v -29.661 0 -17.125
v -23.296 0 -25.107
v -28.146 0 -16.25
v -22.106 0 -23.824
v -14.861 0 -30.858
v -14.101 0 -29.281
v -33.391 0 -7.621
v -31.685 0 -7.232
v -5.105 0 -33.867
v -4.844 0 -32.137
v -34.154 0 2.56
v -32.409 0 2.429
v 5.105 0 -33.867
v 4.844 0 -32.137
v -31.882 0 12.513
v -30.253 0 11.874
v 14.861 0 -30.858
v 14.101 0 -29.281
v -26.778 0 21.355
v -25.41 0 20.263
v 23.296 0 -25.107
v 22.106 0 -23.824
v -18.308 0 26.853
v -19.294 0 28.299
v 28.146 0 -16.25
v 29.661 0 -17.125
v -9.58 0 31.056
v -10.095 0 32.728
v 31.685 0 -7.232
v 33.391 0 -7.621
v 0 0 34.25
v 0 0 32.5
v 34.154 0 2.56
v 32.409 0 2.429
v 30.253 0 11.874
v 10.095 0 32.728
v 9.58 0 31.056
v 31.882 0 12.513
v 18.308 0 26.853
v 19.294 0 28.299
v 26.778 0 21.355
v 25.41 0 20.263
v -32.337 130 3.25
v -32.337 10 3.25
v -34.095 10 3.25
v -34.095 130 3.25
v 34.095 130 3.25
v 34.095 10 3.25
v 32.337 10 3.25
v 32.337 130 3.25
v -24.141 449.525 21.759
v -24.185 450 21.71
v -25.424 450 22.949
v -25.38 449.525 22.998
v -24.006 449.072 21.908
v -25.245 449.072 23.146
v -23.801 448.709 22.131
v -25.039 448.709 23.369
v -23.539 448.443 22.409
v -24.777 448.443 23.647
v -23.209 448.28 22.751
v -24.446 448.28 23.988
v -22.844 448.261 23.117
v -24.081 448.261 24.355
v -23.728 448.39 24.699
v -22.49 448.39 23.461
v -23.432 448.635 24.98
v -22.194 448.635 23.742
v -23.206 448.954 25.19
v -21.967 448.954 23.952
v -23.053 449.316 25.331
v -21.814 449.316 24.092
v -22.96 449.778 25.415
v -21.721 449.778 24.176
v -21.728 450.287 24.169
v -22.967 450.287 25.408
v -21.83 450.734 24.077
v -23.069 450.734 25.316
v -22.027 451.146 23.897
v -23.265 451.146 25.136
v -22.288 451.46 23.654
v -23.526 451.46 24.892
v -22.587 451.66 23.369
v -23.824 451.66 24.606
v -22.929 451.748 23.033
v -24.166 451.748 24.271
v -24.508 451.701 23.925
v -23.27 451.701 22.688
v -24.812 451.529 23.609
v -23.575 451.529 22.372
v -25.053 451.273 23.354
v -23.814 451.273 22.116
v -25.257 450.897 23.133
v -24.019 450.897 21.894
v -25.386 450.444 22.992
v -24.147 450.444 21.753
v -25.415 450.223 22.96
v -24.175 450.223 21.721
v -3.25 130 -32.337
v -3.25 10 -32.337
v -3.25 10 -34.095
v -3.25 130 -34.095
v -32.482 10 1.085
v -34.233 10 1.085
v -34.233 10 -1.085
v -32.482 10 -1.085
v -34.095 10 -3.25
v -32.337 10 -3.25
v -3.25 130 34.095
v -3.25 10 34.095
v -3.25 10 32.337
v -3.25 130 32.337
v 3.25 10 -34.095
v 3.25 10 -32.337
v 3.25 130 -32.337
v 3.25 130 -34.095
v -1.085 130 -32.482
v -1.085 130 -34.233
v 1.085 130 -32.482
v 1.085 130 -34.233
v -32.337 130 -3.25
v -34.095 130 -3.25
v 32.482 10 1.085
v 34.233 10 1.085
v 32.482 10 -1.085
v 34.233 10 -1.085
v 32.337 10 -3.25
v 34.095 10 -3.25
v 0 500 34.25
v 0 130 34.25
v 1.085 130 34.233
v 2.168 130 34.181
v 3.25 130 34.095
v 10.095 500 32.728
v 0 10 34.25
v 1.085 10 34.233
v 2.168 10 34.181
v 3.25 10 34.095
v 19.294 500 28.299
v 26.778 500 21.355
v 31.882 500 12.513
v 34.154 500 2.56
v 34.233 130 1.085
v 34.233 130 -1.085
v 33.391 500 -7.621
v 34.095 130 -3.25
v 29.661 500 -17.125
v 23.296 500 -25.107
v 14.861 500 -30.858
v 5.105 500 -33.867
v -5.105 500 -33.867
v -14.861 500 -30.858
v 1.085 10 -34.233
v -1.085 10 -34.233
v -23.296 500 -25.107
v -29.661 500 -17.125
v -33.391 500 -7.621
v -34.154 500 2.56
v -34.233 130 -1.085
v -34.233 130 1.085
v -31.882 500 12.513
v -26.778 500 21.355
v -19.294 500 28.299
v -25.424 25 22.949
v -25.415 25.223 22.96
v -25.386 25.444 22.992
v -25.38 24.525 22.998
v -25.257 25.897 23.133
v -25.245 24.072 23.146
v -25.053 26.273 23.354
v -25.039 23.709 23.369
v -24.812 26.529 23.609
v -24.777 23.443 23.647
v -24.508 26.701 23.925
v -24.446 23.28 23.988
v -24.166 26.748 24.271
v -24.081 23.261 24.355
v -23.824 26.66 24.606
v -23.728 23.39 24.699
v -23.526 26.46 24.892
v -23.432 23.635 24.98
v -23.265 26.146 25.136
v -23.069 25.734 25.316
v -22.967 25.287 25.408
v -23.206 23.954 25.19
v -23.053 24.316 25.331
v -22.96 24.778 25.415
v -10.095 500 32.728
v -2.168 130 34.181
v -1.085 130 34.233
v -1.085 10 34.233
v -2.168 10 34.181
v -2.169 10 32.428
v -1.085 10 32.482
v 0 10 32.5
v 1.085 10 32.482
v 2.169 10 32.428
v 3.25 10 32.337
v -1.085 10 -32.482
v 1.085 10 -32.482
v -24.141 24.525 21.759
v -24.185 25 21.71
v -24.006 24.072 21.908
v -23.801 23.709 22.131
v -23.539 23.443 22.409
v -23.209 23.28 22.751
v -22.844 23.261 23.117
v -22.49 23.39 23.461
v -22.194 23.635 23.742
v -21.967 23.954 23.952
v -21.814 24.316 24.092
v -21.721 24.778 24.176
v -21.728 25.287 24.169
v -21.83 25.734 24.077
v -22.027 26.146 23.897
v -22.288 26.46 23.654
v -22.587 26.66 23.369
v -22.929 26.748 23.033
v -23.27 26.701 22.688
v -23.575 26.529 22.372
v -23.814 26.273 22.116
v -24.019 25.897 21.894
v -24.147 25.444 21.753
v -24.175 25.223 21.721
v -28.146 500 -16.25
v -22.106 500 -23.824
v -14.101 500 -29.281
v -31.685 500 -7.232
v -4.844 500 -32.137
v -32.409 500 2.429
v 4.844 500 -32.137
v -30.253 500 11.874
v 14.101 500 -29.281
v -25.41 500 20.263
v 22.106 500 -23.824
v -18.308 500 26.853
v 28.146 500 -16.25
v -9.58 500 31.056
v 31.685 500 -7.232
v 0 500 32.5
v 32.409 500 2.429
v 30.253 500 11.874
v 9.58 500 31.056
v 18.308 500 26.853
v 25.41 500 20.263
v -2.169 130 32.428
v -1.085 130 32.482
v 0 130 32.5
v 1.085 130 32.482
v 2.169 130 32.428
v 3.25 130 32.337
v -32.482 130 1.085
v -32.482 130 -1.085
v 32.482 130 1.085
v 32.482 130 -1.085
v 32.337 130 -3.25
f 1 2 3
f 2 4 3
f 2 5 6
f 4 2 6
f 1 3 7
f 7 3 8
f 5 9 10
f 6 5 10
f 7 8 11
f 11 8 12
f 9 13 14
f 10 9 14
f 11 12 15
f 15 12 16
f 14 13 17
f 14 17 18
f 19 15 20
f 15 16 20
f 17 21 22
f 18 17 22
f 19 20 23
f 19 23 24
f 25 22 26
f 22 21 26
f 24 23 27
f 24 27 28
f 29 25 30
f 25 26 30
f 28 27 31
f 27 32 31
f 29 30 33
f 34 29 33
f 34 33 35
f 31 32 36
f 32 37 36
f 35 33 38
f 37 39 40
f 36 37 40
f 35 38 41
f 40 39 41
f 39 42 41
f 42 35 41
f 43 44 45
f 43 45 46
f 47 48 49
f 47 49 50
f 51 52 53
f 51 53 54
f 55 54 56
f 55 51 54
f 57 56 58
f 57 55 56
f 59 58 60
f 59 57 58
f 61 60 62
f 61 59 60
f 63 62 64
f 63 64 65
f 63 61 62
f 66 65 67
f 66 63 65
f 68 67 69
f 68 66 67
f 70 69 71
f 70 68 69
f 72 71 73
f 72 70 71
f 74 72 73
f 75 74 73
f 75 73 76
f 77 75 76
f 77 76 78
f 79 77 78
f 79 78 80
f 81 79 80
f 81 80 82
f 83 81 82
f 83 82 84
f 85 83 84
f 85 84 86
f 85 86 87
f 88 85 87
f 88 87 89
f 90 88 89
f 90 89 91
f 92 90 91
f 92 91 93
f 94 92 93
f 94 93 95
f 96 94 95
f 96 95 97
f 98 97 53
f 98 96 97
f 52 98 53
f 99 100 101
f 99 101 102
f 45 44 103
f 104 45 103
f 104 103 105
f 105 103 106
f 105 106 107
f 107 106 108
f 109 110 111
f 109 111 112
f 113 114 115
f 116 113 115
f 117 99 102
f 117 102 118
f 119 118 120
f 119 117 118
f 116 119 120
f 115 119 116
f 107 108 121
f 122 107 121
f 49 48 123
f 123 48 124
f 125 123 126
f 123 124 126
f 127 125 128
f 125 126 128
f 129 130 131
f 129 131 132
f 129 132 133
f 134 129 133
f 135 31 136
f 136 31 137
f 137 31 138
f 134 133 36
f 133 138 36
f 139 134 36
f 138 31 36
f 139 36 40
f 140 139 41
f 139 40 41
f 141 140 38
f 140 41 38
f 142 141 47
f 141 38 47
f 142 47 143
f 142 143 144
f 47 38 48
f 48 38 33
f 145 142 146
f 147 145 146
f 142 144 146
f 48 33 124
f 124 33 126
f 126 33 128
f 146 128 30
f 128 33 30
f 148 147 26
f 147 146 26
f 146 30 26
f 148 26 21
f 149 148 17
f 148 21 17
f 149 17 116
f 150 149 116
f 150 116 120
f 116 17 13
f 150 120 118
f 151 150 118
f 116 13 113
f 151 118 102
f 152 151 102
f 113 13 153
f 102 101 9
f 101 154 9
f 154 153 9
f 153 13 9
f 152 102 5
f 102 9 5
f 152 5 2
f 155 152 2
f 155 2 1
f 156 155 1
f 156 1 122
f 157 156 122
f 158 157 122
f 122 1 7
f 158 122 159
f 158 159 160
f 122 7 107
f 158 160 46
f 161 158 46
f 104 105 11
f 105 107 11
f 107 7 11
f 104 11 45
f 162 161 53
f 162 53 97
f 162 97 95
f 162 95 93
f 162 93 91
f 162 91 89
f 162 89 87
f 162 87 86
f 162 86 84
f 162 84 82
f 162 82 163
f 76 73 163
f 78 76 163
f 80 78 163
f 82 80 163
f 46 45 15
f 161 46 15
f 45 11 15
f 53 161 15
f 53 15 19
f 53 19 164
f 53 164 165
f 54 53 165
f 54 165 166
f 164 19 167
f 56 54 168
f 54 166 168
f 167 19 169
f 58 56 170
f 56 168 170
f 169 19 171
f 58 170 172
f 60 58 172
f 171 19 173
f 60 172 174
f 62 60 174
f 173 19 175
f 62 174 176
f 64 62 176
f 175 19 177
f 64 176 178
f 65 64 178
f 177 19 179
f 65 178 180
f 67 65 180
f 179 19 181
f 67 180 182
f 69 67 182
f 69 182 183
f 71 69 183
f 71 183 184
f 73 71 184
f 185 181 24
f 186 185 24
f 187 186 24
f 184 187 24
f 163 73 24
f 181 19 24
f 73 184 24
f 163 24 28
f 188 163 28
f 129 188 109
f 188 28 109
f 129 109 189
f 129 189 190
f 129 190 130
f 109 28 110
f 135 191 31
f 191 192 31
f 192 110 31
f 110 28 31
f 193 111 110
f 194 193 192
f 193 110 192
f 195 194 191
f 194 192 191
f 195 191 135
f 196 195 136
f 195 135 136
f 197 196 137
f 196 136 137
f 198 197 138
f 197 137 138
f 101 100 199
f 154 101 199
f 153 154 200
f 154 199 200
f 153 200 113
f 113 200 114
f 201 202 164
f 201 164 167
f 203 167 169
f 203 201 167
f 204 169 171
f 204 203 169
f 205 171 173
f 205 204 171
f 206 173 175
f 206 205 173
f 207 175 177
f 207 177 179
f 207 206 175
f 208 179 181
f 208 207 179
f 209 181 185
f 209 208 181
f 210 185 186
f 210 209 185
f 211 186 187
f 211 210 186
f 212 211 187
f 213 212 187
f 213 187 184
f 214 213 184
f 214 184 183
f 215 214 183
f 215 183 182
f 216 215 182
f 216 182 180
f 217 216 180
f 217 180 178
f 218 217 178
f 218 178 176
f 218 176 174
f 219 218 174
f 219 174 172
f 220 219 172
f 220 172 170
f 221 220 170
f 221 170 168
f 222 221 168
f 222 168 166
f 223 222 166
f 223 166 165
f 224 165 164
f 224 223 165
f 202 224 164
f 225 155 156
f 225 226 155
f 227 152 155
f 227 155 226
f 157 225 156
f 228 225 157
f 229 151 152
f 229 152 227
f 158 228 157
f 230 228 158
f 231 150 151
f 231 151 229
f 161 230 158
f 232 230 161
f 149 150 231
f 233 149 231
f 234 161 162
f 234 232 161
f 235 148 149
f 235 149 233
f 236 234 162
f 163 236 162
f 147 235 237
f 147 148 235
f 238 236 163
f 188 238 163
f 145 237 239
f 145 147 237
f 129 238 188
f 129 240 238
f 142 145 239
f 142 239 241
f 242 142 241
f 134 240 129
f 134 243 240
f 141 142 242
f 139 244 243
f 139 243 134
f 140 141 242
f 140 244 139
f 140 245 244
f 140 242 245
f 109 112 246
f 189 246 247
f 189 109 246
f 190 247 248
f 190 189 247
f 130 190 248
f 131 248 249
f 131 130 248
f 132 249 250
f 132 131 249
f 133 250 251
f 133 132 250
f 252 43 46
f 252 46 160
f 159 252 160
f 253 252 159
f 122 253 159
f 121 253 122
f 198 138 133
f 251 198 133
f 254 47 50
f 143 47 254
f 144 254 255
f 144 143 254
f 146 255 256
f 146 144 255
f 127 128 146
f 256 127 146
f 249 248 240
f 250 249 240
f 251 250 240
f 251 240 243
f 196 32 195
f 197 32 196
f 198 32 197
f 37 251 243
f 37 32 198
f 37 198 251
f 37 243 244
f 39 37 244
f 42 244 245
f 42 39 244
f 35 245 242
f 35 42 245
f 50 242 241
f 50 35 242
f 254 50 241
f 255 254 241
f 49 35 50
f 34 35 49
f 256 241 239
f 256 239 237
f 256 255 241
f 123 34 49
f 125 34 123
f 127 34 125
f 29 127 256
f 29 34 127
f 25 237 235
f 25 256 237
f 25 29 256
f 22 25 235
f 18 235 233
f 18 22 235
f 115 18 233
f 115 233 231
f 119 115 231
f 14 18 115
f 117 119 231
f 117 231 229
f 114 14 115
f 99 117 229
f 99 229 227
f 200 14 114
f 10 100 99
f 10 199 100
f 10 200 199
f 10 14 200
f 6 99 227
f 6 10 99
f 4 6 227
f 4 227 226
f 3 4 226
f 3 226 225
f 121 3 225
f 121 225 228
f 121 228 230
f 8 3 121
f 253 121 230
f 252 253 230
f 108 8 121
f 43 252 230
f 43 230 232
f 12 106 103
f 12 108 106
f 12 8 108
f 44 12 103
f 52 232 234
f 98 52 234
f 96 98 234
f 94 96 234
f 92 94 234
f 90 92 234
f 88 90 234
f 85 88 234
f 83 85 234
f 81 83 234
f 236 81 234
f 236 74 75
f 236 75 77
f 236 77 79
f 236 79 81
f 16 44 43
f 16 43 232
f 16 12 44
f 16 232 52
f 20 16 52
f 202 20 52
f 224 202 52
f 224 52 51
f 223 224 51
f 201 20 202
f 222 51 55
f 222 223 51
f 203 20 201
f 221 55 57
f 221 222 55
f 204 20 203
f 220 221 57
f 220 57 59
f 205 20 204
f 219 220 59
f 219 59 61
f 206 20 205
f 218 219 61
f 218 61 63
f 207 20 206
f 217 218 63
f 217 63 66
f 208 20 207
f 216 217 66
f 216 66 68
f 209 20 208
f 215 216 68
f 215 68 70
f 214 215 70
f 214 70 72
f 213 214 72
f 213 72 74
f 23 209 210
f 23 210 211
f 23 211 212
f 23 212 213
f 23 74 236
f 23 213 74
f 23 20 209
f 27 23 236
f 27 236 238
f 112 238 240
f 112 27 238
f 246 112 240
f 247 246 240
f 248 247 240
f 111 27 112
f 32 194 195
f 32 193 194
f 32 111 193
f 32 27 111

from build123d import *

# Parameters (mm, degrees)
SKETCH1_R                       = 34.25
SKETCH1_R_2                     = 32.5
BULK_DEPTH                      = 500
SKETCH2_R                       = 1.75
LAUNCH_LUG_SCREW_HOLES_DEPTH    = 503.340646375
SKETCH3_W                       = 6.5
SKETCH3_H                       = 120
THRU_WALL_FIN_CUTS_DEPTH        = 503.340646488
THRU_WALL_FIN_CUT_PATTERN_COUNT = 2
THRU_WALL_FIN_CUT_PATTERN_ANGLE = 90


with BuildPart() as part:
    # Sketch1 → BULK (new body)
    with BuildSketch(Plane(origin=(0, 0, 0), x_dir=(1, 0, 0), z_dir=(0, 1, 0))):
        Circle(SKETCH1_R)
        Circle(SKETCH1_R_2, mode=Mode.SUBTRACT)
    extrude(amount=BULK_DEPTH)

    # Sketch2 → LAUNCH LUG SCREW HOLES (cut, through all)
    with BuildSketch(Plane(origin=(0, 0, 0), x_dir=(0.7071067811865477, 0, 0.7071067811865475), z_dir=(-0.7071067811865475, 0, 0.7071067811865477))):
        with Locations((0, 25)):
            Circle(SKETCH2_R)
        with Locations((0, 450)):
            Circle(SKETCH2_R)
    extrude(amount=LAUNCH_LUG_SCREW_HOLES_DEPTH, mode=Mode.SUBTRACT)

    # Sketch3 → THRU WALL FIN CUTS (cut, symmetric)
    with BuildSketch(Plane.XY):
        with Locations((0, 70)):
            Rectangle(SKETCH3_W, SKETCH3_H)
    thru_wall_fin_cuts = extrude(amount=THRU_WALL_FIN_CUTS_DEPTH, both=True, mode=Mode.SUBTRACT)

    # THRU WALL FIN CUT PATTERN: THRU WALL FIN CUTS ×2 about axis
    thru_wall_fin_cut_pattern_axis = Axis((0, -25, 0), (0, 1, 0))
    for i in range(1, THRU_WALL_FIN_CUT_PATTERN_COUNT):
        add(thru_wall_fin_cuts.rotate(thru_wall_fin_cut_pattern_axis, i * THRU_WALL_FIN_CUT_PATTERN_ANGLE / (THRU_WALL_FIN_CUT_PATTERN_COUNT - 1)), mode=Mode.SUBTRACT)


solid = part.part
